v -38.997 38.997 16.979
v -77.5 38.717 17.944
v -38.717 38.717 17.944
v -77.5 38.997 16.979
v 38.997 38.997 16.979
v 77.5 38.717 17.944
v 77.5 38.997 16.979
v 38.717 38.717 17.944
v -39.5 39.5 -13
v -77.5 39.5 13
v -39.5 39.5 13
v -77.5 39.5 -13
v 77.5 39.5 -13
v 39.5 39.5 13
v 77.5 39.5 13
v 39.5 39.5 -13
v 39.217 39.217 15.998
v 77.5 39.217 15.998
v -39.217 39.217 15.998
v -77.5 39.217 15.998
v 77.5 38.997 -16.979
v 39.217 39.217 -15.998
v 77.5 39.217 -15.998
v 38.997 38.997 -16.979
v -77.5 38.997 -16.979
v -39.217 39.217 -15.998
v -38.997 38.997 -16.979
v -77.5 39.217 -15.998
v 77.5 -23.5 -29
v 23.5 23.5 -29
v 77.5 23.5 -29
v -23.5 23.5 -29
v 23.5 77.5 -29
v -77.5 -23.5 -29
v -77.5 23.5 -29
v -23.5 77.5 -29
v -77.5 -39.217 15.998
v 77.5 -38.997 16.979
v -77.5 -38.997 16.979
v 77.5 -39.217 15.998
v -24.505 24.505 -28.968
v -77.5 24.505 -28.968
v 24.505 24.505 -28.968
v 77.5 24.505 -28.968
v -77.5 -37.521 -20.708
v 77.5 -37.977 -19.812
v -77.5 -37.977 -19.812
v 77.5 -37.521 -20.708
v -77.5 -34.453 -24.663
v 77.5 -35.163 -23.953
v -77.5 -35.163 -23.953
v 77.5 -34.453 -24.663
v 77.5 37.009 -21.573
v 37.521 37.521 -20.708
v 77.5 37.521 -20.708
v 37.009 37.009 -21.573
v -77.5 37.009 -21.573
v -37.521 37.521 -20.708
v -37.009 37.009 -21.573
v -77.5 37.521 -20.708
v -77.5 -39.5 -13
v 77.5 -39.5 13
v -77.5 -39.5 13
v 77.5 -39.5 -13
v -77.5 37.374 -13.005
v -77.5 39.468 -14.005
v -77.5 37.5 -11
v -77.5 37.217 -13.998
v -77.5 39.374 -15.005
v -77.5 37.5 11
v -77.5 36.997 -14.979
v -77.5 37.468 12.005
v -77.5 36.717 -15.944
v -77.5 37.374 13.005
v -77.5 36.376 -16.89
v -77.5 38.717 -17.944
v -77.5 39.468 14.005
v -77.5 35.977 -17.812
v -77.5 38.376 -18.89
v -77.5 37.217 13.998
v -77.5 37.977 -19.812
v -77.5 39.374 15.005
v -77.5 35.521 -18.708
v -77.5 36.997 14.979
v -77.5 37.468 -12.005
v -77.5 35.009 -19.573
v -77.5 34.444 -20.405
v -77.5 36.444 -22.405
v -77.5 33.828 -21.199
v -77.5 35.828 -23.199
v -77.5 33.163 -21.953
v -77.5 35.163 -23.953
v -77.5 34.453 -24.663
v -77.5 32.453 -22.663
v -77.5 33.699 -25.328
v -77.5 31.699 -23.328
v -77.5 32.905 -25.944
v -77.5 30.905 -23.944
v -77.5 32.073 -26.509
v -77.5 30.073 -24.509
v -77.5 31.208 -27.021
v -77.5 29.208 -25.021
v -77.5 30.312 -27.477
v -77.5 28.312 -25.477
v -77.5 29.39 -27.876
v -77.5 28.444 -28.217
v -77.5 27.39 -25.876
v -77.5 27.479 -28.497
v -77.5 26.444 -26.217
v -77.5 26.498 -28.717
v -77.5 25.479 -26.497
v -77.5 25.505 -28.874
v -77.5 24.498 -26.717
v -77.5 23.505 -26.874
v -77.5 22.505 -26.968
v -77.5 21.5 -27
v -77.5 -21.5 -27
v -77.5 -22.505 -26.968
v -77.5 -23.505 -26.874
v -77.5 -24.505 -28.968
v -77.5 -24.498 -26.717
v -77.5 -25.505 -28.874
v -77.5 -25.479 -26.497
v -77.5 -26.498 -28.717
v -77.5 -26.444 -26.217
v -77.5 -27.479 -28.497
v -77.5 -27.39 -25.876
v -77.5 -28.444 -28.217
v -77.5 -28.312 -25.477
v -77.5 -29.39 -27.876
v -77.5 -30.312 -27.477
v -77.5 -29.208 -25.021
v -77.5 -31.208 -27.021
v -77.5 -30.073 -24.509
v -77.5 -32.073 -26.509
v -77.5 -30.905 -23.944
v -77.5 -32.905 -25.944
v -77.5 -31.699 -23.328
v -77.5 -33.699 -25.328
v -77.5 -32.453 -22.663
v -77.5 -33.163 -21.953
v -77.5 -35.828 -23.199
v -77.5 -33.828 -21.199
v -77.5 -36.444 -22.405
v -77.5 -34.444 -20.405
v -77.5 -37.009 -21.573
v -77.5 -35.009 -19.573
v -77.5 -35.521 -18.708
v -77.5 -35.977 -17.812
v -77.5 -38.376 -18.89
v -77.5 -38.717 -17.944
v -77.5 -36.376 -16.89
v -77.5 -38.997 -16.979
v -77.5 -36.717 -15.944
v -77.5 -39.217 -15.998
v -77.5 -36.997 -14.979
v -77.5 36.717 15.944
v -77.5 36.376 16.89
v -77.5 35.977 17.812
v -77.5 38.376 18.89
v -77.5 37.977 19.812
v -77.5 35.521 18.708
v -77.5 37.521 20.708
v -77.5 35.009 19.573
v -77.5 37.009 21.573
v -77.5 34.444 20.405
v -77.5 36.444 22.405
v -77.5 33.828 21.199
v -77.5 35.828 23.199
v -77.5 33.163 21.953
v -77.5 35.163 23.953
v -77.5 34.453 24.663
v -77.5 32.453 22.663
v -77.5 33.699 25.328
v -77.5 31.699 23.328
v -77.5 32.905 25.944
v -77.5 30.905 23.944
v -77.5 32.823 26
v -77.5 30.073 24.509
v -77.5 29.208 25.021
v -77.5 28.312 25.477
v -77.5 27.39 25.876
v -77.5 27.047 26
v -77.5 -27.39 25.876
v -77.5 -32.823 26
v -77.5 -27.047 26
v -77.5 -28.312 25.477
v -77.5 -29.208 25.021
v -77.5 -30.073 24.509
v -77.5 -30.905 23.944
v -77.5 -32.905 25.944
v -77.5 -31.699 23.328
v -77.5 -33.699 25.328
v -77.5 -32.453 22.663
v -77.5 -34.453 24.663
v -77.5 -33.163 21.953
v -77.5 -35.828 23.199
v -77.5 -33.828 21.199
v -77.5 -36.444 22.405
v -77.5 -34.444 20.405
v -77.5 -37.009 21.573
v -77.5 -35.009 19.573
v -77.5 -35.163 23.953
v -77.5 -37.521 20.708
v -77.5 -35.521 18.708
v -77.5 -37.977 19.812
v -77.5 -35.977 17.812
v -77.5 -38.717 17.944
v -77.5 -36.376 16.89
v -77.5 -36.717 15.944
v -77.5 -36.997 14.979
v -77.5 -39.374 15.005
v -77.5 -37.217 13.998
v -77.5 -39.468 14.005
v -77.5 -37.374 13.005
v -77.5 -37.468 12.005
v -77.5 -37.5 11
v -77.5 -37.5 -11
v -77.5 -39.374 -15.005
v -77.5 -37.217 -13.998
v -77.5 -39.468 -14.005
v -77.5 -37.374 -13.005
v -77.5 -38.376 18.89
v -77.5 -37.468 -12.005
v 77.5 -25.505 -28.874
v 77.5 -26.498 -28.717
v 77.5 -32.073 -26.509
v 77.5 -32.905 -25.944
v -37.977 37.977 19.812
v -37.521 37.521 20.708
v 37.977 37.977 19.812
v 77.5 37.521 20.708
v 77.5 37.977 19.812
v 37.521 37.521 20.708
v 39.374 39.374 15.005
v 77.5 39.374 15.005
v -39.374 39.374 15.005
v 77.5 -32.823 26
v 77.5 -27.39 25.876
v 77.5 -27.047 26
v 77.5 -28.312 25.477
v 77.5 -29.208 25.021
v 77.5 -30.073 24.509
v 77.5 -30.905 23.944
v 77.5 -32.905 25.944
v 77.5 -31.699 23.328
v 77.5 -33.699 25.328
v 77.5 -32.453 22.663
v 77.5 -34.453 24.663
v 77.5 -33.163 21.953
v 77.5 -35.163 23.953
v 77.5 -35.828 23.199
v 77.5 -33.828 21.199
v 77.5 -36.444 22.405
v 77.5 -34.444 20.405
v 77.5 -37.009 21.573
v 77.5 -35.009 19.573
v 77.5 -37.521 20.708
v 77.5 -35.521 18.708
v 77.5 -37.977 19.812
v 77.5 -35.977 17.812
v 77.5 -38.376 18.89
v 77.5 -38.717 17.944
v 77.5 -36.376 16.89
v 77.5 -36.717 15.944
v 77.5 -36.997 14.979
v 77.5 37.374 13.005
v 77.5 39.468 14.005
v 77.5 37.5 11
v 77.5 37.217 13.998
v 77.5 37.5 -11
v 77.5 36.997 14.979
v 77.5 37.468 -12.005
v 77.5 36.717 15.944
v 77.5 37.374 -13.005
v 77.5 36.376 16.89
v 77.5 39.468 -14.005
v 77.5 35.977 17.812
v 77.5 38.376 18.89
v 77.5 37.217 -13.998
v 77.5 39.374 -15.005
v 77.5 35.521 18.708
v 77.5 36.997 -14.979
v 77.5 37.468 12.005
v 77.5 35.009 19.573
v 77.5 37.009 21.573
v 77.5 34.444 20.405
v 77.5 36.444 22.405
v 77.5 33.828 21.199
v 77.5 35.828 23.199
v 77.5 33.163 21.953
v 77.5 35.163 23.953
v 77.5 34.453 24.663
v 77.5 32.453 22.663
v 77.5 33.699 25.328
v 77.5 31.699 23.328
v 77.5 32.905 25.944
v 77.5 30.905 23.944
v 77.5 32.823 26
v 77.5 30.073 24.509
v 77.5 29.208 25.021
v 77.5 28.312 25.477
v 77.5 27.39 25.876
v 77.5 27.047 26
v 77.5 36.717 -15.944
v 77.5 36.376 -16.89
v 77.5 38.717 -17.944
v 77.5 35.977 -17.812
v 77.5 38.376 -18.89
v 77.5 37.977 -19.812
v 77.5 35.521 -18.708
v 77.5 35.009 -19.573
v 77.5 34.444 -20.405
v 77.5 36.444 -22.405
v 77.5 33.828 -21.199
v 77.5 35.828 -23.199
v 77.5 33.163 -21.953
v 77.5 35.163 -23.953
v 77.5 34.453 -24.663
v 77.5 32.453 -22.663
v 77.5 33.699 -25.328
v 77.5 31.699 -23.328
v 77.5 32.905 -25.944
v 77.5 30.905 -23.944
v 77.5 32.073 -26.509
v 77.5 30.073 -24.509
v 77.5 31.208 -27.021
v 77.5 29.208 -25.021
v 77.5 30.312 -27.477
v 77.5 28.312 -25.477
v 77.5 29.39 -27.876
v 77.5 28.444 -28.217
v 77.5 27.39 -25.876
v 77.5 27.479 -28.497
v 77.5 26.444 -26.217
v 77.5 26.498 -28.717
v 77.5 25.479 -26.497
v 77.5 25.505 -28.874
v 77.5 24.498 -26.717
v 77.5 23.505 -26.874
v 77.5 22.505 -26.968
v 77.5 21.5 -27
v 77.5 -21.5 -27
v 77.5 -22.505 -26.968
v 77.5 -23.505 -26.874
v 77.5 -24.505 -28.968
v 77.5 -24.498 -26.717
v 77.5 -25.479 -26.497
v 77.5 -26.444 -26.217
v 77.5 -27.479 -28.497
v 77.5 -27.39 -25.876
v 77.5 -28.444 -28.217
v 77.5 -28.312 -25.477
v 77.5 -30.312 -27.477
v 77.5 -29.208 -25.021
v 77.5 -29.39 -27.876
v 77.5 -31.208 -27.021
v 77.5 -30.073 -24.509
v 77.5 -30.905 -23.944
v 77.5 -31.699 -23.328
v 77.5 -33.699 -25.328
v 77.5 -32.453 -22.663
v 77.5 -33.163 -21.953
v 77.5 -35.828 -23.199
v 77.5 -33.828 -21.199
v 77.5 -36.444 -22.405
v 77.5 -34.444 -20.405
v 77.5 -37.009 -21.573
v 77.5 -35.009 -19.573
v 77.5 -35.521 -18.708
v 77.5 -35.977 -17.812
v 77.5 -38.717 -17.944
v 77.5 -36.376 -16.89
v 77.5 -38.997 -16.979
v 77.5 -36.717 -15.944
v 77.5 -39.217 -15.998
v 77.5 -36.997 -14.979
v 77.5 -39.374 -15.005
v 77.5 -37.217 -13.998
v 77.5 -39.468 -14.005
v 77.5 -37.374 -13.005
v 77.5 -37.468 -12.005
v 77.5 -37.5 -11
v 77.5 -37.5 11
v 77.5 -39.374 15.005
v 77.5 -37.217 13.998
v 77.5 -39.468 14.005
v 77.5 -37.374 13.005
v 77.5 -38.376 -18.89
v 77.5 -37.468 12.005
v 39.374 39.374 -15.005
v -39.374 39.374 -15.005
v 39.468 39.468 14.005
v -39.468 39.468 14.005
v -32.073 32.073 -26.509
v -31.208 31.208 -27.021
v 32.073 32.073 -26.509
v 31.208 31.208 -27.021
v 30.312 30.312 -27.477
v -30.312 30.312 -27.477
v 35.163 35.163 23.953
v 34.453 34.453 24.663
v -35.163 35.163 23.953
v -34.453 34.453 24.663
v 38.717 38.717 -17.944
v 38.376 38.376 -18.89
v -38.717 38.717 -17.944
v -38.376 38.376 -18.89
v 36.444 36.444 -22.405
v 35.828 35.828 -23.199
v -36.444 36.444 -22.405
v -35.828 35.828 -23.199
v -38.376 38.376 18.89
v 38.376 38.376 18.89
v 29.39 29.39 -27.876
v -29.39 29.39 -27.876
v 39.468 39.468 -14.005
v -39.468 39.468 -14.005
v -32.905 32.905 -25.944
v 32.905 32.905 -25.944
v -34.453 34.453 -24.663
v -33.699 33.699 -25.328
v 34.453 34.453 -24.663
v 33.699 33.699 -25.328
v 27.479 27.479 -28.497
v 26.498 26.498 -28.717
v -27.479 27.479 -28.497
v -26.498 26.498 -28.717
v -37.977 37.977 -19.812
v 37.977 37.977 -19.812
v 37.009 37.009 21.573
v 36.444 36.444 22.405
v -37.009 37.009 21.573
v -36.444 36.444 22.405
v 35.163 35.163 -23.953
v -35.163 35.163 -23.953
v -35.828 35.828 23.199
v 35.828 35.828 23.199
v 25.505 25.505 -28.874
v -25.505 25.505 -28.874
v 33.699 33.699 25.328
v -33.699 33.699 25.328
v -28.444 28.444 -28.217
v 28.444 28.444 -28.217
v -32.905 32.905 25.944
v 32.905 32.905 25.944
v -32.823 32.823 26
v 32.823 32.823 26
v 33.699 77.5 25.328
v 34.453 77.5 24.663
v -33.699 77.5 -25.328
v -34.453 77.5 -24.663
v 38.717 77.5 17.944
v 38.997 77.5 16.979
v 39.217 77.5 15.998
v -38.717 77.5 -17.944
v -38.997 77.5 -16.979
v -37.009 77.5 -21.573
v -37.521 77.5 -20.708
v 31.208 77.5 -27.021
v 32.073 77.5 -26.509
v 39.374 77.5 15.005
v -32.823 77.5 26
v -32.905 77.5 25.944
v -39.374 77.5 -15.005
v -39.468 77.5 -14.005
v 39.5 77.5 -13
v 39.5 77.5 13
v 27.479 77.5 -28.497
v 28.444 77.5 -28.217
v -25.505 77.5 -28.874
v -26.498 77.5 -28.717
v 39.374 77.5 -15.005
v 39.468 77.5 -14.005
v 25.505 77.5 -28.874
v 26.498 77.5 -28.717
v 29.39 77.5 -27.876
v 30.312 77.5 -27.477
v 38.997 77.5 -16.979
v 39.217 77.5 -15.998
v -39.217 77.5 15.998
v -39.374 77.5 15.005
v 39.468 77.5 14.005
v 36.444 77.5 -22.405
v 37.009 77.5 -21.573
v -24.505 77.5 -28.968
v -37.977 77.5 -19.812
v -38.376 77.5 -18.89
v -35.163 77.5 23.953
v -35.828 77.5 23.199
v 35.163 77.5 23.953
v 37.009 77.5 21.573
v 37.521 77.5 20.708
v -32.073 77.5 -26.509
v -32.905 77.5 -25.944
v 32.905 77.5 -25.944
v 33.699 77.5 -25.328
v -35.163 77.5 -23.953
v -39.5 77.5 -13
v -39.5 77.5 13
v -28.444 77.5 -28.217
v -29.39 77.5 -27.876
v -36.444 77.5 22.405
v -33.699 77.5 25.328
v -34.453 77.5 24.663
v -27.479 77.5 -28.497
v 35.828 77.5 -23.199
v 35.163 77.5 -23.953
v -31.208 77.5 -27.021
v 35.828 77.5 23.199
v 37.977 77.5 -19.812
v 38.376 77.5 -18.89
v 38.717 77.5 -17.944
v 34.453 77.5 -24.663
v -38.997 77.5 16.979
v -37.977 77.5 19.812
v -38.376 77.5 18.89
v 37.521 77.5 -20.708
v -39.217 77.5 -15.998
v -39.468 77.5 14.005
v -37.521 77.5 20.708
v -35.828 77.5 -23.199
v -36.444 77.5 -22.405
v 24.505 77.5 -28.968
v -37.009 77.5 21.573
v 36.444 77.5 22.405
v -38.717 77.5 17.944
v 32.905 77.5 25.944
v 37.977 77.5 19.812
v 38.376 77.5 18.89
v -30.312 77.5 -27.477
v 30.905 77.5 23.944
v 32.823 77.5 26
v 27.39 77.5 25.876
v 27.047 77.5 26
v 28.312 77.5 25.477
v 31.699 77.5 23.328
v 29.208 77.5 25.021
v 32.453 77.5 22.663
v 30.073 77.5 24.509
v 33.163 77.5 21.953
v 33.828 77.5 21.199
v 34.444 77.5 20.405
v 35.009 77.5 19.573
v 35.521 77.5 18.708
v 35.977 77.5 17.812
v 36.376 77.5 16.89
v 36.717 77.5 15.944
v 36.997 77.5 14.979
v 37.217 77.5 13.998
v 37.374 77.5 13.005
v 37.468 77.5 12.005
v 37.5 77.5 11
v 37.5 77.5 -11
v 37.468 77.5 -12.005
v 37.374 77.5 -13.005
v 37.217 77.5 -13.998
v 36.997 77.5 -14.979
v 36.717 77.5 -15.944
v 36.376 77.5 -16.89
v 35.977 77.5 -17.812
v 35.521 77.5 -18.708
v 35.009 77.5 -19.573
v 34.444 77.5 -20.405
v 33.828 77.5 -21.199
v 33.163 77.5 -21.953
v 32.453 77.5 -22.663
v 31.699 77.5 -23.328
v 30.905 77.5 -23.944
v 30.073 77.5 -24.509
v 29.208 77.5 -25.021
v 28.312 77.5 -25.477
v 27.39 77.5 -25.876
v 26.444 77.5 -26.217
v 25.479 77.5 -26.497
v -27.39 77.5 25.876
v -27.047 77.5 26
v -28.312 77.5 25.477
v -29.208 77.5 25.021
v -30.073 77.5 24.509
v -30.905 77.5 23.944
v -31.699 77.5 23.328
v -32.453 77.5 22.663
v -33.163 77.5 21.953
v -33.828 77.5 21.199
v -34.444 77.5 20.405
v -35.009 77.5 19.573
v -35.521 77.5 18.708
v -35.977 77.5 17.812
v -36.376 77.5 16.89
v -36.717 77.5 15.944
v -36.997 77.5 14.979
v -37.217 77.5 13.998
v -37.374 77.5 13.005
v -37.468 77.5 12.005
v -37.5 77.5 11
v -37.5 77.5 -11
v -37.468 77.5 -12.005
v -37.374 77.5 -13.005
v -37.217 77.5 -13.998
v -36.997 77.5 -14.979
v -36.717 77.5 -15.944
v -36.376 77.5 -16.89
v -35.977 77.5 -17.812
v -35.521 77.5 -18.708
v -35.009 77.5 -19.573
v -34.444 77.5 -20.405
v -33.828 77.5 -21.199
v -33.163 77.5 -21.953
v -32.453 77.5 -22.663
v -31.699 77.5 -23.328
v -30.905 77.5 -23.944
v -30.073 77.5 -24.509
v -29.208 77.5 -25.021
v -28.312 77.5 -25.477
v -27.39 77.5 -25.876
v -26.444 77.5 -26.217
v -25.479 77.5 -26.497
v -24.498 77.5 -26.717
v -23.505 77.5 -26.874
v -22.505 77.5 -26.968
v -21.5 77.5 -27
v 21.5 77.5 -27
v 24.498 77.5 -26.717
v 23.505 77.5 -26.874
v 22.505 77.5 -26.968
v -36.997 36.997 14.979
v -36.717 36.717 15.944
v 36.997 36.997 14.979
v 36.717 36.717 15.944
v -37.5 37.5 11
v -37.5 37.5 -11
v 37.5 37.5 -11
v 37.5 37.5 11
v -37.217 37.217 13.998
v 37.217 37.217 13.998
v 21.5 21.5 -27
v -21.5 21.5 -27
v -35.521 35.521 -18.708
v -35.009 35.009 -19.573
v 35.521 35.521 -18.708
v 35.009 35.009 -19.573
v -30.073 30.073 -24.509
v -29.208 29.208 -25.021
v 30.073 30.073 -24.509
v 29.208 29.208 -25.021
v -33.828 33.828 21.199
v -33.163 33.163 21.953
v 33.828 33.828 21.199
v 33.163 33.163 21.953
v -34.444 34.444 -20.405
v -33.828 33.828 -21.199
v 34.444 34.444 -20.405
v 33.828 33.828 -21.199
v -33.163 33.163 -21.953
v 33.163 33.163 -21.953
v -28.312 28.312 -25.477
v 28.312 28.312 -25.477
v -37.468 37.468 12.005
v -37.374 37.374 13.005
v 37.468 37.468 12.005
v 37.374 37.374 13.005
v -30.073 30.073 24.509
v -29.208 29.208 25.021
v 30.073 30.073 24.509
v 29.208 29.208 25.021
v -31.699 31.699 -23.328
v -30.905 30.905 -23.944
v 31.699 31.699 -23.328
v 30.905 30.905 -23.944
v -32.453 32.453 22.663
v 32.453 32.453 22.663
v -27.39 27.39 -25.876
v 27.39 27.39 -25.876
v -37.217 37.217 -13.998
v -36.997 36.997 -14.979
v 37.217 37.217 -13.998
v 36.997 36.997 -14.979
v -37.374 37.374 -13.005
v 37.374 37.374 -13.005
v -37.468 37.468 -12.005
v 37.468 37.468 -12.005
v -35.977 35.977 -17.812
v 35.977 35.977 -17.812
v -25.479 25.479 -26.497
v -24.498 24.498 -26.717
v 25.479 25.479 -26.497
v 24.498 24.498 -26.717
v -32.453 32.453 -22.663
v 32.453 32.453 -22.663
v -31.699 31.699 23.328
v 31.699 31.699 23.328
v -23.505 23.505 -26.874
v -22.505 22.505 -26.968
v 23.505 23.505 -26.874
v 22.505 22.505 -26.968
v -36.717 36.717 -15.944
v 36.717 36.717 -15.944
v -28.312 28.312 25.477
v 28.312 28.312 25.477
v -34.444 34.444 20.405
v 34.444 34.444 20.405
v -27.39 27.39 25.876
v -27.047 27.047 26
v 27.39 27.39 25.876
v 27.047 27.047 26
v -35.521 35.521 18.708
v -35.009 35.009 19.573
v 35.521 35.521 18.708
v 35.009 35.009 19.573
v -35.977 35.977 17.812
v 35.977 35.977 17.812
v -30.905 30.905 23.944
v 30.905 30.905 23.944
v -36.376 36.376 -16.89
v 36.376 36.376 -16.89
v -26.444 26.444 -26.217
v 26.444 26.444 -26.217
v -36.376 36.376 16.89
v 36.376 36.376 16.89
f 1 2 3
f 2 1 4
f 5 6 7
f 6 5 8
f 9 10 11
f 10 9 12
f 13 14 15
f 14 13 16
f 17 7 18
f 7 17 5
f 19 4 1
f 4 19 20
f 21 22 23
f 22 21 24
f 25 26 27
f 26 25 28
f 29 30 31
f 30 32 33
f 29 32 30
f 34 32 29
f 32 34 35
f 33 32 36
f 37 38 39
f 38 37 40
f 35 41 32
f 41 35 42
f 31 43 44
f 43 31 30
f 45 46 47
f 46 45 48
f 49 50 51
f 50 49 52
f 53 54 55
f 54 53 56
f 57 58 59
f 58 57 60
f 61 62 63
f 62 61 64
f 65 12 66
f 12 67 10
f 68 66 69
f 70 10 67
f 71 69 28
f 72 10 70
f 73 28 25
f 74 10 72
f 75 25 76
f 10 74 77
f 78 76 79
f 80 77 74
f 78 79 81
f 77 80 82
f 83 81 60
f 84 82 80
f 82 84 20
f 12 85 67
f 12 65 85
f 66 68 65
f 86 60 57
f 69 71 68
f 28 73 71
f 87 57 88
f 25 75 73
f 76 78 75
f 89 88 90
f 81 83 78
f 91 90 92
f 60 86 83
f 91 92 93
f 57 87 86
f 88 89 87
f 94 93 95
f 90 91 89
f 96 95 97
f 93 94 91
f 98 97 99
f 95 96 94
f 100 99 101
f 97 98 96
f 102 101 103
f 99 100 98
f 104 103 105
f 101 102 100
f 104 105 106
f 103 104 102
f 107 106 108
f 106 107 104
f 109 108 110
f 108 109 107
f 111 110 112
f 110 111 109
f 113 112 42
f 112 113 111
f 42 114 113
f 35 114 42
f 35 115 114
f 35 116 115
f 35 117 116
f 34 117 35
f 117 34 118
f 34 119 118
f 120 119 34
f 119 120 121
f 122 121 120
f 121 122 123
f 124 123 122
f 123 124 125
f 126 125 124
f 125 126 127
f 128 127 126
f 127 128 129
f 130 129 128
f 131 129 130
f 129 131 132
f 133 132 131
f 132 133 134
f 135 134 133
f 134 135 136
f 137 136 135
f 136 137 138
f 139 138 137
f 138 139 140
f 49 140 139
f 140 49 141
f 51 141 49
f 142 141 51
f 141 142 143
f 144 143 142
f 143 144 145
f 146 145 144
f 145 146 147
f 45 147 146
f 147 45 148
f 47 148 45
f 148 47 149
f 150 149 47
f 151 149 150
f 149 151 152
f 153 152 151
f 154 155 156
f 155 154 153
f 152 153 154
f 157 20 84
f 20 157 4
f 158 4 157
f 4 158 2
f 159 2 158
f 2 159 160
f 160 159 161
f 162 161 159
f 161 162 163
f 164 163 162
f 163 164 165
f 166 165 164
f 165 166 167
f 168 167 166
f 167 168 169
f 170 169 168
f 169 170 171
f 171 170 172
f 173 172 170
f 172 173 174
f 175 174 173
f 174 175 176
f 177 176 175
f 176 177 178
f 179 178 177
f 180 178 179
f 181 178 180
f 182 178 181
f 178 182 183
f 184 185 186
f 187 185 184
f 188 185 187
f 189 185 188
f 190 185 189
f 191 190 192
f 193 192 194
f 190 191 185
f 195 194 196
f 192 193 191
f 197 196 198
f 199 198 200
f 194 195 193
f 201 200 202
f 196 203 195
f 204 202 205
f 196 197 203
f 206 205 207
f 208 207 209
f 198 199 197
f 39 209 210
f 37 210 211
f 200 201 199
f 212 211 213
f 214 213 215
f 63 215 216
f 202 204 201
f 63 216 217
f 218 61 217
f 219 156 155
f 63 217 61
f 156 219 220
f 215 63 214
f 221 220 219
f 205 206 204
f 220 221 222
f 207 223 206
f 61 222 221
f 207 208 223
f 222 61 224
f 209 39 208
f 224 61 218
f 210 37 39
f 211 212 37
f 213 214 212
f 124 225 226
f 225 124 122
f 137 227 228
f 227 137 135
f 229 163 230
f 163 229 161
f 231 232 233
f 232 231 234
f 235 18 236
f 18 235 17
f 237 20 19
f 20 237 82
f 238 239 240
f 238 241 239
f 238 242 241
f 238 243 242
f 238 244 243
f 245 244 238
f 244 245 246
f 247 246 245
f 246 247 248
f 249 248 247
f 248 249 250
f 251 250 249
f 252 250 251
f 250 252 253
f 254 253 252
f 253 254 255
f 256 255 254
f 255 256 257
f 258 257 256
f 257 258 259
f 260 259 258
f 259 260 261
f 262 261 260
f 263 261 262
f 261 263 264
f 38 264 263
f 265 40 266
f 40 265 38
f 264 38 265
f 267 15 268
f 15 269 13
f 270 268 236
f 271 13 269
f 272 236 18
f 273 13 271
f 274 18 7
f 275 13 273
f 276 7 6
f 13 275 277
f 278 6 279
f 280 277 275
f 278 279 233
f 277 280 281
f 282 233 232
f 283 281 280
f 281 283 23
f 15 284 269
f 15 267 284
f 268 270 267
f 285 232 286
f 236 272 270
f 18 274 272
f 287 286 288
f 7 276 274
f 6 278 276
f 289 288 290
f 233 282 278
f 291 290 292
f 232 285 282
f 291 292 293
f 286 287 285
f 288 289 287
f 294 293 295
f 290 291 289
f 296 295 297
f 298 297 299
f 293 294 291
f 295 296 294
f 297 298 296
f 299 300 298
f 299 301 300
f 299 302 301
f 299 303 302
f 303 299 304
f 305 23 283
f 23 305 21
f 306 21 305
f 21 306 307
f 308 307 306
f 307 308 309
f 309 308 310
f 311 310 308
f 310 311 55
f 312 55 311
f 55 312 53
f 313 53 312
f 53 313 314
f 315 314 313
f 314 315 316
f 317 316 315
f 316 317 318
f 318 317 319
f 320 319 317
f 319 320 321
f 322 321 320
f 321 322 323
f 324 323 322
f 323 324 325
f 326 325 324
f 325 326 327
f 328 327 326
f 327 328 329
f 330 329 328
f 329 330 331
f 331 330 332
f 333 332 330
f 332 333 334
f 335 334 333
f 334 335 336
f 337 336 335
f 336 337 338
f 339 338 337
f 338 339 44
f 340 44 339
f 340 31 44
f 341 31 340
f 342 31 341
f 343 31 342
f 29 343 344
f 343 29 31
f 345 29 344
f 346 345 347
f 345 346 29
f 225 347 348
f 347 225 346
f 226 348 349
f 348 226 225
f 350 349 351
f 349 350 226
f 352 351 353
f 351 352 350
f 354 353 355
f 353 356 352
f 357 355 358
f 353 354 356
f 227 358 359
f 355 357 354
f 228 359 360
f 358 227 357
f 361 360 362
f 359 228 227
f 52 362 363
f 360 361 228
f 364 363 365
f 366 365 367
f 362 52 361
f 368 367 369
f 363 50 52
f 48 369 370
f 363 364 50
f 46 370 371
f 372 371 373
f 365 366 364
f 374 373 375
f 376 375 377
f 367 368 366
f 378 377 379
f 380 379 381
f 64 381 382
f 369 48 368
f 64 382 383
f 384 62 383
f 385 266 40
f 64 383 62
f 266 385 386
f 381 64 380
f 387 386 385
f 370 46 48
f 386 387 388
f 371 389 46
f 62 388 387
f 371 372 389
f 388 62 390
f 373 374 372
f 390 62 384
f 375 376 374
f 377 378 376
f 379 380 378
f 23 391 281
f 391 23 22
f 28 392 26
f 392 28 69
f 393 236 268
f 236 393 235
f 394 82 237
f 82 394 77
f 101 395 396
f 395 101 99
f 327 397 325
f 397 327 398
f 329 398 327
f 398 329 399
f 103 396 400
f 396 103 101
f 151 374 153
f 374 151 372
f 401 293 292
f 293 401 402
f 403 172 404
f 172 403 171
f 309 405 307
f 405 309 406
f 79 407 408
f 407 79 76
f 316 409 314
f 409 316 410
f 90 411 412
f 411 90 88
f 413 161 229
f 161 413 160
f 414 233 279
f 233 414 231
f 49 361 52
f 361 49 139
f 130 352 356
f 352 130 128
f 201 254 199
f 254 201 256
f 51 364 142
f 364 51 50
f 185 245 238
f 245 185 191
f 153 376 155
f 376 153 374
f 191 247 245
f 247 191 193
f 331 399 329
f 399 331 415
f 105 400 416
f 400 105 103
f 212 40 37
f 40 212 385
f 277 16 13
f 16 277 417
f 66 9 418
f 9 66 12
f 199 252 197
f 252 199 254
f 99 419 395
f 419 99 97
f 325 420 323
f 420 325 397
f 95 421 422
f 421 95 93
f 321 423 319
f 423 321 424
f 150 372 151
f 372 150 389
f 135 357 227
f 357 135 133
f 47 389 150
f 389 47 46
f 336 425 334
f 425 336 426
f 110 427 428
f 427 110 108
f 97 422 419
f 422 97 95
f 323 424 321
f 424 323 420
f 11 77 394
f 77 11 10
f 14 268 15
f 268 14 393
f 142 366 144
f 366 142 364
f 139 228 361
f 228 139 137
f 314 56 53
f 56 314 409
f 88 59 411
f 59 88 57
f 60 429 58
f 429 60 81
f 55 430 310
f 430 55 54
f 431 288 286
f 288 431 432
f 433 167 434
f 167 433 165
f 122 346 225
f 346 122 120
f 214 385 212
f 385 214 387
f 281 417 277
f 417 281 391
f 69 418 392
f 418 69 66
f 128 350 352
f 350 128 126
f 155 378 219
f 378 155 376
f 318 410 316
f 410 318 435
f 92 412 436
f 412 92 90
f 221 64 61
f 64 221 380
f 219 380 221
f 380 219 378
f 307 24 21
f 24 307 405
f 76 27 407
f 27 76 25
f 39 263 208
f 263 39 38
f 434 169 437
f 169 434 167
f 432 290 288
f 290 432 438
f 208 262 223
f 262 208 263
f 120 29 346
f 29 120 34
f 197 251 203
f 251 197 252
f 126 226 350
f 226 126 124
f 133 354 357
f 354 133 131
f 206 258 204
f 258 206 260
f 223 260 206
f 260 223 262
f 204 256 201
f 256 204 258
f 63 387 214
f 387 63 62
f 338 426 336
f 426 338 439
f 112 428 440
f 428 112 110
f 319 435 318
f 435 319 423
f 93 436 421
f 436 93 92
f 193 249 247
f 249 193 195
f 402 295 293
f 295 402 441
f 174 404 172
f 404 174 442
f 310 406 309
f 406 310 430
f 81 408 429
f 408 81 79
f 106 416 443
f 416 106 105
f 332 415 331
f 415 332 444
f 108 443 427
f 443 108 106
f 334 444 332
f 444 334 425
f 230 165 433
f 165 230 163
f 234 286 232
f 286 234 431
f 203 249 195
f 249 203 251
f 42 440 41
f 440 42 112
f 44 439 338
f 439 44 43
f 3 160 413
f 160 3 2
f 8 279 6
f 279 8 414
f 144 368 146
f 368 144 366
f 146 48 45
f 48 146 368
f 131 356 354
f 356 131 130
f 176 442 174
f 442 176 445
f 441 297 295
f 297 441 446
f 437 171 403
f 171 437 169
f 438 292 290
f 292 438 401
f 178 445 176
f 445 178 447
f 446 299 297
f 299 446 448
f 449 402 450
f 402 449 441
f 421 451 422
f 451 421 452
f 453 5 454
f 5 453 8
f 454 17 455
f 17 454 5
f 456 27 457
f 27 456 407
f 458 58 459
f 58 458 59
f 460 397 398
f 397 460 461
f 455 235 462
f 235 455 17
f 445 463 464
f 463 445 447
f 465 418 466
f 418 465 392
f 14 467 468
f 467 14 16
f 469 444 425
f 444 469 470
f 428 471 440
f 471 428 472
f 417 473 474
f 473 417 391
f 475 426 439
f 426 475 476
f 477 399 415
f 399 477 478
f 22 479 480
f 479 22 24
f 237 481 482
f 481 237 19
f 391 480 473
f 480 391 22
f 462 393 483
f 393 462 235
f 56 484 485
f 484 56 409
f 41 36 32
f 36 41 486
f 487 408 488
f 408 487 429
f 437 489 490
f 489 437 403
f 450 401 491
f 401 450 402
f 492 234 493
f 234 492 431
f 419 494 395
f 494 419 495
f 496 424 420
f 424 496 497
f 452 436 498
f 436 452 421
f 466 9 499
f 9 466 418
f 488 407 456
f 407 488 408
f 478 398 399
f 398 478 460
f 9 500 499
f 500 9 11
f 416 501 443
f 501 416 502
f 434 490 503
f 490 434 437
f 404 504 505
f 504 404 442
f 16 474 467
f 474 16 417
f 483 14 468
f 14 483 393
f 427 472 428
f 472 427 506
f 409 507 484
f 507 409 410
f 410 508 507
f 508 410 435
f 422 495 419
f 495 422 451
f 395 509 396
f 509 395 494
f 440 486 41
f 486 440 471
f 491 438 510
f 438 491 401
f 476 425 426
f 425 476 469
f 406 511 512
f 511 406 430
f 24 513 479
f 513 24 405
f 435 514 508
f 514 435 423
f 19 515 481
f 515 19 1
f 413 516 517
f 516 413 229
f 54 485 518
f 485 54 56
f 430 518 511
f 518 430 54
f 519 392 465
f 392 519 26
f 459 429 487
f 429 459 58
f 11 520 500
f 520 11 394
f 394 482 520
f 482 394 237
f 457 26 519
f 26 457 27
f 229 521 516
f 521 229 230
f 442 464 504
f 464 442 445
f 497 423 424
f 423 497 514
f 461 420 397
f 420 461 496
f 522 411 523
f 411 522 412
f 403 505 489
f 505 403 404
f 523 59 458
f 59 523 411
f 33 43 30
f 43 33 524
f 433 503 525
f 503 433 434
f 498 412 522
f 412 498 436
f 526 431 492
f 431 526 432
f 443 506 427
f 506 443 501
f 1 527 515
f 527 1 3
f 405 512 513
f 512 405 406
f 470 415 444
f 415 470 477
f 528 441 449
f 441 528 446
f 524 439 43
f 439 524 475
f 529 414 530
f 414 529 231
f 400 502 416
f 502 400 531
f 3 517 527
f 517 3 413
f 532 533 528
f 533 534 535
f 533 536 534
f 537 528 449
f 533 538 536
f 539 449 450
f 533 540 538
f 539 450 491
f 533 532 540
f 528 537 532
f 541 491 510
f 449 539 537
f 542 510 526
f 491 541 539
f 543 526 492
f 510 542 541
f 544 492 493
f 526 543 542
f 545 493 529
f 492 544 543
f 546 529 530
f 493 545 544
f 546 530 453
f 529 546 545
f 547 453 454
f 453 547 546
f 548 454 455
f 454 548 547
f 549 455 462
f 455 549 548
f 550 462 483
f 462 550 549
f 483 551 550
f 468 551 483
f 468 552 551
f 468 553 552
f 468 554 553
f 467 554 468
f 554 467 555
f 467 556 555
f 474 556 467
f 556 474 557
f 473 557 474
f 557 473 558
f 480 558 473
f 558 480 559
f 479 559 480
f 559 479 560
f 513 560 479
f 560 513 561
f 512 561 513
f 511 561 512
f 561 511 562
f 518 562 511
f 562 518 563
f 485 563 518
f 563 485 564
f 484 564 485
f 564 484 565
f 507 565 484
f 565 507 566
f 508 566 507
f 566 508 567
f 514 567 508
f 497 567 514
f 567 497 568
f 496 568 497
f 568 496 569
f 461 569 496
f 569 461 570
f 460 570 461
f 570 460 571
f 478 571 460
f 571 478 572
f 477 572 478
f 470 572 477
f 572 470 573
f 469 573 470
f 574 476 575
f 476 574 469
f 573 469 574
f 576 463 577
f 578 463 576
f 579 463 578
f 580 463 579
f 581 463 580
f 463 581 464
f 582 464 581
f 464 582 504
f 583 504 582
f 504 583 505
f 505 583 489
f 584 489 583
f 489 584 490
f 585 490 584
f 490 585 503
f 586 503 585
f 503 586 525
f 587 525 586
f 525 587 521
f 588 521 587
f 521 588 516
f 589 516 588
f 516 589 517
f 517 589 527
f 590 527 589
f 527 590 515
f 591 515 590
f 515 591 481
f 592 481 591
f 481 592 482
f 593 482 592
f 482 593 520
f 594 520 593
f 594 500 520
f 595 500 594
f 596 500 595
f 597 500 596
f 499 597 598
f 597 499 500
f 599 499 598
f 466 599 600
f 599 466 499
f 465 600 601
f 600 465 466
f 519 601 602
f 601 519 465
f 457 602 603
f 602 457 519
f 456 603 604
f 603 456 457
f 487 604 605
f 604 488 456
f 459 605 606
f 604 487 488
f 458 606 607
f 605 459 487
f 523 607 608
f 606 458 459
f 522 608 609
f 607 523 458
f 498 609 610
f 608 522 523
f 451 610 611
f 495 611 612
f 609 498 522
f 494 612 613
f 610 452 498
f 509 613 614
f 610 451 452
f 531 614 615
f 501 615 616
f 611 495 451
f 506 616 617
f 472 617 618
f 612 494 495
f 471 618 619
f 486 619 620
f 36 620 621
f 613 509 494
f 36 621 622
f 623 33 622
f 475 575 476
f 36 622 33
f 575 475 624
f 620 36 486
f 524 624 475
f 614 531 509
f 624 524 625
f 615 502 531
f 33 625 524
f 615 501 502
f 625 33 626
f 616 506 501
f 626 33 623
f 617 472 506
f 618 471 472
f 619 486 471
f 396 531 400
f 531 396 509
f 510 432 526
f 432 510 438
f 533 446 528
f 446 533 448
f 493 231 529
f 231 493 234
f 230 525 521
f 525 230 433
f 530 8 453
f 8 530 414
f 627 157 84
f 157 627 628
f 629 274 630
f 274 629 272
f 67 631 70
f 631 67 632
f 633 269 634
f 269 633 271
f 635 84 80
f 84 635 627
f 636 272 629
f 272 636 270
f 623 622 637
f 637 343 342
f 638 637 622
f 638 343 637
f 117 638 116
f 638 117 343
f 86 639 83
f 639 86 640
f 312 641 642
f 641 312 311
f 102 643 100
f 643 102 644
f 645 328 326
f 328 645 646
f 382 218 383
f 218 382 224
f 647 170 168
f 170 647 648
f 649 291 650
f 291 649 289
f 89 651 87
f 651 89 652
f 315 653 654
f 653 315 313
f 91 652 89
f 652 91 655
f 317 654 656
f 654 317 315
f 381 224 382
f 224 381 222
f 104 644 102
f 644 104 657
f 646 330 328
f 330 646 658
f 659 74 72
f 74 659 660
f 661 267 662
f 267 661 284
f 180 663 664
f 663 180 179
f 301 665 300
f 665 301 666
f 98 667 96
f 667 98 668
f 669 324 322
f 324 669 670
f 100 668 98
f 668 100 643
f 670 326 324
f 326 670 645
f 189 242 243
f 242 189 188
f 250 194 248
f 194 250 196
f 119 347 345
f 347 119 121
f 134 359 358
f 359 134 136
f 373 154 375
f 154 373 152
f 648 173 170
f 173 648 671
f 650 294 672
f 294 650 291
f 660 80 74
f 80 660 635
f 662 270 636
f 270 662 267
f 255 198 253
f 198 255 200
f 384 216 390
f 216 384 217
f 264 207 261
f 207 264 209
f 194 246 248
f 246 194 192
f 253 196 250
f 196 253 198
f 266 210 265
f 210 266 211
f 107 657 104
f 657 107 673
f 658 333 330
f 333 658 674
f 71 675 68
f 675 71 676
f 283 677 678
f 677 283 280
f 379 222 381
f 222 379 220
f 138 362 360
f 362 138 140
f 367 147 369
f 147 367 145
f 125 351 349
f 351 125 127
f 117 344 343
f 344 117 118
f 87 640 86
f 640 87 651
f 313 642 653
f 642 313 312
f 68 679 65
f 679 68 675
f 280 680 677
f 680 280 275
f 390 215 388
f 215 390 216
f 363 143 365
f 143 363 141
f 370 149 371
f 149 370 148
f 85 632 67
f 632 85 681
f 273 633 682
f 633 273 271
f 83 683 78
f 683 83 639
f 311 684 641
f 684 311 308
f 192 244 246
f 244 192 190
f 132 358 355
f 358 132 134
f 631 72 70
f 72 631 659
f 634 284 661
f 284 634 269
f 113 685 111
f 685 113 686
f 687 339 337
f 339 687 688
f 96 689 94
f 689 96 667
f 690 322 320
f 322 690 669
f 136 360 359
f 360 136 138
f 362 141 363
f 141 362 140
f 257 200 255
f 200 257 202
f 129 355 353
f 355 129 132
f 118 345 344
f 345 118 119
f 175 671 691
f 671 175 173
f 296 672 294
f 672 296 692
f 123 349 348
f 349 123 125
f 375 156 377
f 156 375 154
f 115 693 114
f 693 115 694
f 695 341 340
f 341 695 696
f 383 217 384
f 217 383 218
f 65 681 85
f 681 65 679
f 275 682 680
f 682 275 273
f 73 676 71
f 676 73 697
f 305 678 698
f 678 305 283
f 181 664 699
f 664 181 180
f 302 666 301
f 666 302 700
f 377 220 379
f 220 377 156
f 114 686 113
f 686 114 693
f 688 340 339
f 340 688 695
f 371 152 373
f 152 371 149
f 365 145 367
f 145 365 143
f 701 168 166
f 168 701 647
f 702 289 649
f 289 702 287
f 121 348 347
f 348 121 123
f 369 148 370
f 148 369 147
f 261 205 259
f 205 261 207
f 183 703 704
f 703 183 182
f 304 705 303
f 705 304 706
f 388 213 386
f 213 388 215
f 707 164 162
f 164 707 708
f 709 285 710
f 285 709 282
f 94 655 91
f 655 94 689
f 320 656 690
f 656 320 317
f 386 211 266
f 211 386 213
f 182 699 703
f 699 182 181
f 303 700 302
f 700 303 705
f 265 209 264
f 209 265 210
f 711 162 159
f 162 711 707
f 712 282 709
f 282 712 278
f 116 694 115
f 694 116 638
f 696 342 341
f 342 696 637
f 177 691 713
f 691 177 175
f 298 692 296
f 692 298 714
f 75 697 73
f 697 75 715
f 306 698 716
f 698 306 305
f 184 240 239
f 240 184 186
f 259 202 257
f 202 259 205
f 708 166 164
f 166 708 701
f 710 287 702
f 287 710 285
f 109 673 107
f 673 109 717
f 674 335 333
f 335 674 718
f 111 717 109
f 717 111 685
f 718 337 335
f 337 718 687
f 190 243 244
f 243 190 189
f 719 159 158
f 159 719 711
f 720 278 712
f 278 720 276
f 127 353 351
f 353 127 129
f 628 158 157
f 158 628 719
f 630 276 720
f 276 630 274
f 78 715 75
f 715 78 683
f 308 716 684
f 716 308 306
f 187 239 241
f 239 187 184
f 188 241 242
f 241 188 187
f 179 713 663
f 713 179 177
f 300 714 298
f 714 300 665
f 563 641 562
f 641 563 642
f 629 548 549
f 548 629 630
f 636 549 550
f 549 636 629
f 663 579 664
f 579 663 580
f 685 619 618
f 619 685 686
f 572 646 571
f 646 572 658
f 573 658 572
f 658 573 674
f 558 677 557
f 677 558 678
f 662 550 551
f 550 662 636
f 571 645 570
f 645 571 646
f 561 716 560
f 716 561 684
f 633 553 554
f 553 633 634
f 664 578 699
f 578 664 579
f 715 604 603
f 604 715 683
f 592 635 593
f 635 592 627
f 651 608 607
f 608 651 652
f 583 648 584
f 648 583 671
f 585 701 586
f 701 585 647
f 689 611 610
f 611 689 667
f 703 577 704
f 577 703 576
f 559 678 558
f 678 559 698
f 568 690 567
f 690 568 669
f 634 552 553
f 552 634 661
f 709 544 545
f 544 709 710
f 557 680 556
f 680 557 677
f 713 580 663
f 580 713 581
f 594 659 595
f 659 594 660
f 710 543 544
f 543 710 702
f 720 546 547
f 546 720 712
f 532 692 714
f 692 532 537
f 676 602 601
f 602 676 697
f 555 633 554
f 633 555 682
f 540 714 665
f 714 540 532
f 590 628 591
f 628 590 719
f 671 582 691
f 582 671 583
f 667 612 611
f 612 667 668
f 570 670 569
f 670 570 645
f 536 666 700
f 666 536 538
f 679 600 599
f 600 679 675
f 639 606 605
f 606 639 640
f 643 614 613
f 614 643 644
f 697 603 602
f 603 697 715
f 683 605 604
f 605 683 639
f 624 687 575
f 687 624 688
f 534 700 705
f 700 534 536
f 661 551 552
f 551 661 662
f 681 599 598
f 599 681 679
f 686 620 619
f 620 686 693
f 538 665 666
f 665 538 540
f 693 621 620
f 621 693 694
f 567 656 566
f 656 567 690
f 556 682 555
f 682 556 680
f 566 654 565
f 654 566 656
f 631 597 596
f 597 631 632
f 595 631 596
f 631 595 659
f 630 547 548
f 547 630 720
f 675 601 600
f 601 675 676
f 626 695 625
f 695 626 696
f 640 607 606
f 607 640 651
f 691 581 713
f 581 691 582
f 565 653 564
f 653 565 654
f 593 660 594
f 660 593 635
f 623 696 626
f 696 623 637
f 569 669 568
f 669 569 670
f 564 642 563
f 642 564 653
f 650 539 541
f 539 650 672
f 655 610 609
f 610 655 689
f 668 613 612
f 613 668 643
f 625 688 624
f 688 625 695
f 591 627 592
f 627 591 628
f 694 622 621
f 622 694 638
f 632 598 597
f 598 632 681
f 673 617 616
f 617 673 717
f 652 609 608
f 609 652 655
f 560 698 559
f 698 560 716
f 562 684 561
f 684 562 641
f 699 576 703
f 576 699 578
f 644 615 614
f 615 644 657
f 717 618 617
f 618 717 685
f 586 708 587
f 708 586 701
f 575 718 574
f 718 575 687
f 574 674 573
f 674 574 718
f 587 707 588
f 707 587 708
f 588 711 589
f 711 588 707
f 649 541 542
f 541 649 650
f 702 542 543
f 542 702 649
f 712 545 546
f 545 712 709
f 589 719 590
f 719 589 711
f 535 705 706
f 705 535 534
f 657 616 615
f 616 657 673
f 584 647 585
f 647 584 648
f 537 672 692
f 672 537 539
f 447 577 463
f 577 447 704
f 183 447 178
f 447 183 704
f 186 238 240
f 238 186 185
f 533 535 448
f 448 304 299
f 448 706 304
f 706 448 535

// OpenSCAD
//$fs = 0.01;
//$fa = 0.01;
$fn = 100;
minkowski_circle = 16;
wallThickness = 4;
height = 155;

//outerwidth1 = 78;
//outerheight1 = 58;
//height1 = 110;
//wallThickness1 = wallThickness;

outerwidth2 = 79 - minkowski_circle;
outerheight2 = 58 - minkowski_circle;
wallThickness2 = wallThickness;

difference()
{
    union()
    {
        translate([-height/2,0,0])
        rotate([90,0,90]) 
        solidTube(outerwidth2,outerheight2,wallThickness2,height);
       
        translate([0,height/2,0])
        rotate([90,0,0]) 
        solidTube(outerwidth2,outerheight2,wallThickness2,height/2); 
    }

    union()
    {
        translate([-height/2-2,0,0])
        rotate([90,0,90]) 
        solidTube(outerwidth2-wallThickness,outerheight2-wallThickness,wallThickness,height+4);
       
        translate([0,height/2+2,0])
        rotate([90,0,0]) 
        solidTube(outerwidth2-wallThickness,outerheight2-wallThickness,wallThickness,height/2+4); 
    }
    
    translate([0,0,height/2+28])
    cube(height + 4, center = true);
    
}

module squareTube(outerwidth, outerheight, wallThickness, height)
{
        //linear_extrude(height,true)
    difference()
    {
        linear_extrude(height,true)
        minkowski()
        {
        square([outerwidth-minkowski_circle, outerheight-minkowski_circle],true);
            circle(minkowski_circle);
        }
        
        #translate([0,0,-2],true)
        linear_extrude(height+4,true)
        minkowski()
        {
        square([outerwidth-wallThickness-minkowski_circle,outerheight-wallThickness-minkowski_circle],true);
                        circle(minkowski_circle);
        }
    }
}

module solidTube(outerwidth, outerheight, wallThickness, height)
{
    linear_extrude(height,true)
    minkowski()
    {
        square([outerwidth-minkowski_circle, outerheight-minkowski_circle],true);
        circle(minkowski_circle);
    }
}
